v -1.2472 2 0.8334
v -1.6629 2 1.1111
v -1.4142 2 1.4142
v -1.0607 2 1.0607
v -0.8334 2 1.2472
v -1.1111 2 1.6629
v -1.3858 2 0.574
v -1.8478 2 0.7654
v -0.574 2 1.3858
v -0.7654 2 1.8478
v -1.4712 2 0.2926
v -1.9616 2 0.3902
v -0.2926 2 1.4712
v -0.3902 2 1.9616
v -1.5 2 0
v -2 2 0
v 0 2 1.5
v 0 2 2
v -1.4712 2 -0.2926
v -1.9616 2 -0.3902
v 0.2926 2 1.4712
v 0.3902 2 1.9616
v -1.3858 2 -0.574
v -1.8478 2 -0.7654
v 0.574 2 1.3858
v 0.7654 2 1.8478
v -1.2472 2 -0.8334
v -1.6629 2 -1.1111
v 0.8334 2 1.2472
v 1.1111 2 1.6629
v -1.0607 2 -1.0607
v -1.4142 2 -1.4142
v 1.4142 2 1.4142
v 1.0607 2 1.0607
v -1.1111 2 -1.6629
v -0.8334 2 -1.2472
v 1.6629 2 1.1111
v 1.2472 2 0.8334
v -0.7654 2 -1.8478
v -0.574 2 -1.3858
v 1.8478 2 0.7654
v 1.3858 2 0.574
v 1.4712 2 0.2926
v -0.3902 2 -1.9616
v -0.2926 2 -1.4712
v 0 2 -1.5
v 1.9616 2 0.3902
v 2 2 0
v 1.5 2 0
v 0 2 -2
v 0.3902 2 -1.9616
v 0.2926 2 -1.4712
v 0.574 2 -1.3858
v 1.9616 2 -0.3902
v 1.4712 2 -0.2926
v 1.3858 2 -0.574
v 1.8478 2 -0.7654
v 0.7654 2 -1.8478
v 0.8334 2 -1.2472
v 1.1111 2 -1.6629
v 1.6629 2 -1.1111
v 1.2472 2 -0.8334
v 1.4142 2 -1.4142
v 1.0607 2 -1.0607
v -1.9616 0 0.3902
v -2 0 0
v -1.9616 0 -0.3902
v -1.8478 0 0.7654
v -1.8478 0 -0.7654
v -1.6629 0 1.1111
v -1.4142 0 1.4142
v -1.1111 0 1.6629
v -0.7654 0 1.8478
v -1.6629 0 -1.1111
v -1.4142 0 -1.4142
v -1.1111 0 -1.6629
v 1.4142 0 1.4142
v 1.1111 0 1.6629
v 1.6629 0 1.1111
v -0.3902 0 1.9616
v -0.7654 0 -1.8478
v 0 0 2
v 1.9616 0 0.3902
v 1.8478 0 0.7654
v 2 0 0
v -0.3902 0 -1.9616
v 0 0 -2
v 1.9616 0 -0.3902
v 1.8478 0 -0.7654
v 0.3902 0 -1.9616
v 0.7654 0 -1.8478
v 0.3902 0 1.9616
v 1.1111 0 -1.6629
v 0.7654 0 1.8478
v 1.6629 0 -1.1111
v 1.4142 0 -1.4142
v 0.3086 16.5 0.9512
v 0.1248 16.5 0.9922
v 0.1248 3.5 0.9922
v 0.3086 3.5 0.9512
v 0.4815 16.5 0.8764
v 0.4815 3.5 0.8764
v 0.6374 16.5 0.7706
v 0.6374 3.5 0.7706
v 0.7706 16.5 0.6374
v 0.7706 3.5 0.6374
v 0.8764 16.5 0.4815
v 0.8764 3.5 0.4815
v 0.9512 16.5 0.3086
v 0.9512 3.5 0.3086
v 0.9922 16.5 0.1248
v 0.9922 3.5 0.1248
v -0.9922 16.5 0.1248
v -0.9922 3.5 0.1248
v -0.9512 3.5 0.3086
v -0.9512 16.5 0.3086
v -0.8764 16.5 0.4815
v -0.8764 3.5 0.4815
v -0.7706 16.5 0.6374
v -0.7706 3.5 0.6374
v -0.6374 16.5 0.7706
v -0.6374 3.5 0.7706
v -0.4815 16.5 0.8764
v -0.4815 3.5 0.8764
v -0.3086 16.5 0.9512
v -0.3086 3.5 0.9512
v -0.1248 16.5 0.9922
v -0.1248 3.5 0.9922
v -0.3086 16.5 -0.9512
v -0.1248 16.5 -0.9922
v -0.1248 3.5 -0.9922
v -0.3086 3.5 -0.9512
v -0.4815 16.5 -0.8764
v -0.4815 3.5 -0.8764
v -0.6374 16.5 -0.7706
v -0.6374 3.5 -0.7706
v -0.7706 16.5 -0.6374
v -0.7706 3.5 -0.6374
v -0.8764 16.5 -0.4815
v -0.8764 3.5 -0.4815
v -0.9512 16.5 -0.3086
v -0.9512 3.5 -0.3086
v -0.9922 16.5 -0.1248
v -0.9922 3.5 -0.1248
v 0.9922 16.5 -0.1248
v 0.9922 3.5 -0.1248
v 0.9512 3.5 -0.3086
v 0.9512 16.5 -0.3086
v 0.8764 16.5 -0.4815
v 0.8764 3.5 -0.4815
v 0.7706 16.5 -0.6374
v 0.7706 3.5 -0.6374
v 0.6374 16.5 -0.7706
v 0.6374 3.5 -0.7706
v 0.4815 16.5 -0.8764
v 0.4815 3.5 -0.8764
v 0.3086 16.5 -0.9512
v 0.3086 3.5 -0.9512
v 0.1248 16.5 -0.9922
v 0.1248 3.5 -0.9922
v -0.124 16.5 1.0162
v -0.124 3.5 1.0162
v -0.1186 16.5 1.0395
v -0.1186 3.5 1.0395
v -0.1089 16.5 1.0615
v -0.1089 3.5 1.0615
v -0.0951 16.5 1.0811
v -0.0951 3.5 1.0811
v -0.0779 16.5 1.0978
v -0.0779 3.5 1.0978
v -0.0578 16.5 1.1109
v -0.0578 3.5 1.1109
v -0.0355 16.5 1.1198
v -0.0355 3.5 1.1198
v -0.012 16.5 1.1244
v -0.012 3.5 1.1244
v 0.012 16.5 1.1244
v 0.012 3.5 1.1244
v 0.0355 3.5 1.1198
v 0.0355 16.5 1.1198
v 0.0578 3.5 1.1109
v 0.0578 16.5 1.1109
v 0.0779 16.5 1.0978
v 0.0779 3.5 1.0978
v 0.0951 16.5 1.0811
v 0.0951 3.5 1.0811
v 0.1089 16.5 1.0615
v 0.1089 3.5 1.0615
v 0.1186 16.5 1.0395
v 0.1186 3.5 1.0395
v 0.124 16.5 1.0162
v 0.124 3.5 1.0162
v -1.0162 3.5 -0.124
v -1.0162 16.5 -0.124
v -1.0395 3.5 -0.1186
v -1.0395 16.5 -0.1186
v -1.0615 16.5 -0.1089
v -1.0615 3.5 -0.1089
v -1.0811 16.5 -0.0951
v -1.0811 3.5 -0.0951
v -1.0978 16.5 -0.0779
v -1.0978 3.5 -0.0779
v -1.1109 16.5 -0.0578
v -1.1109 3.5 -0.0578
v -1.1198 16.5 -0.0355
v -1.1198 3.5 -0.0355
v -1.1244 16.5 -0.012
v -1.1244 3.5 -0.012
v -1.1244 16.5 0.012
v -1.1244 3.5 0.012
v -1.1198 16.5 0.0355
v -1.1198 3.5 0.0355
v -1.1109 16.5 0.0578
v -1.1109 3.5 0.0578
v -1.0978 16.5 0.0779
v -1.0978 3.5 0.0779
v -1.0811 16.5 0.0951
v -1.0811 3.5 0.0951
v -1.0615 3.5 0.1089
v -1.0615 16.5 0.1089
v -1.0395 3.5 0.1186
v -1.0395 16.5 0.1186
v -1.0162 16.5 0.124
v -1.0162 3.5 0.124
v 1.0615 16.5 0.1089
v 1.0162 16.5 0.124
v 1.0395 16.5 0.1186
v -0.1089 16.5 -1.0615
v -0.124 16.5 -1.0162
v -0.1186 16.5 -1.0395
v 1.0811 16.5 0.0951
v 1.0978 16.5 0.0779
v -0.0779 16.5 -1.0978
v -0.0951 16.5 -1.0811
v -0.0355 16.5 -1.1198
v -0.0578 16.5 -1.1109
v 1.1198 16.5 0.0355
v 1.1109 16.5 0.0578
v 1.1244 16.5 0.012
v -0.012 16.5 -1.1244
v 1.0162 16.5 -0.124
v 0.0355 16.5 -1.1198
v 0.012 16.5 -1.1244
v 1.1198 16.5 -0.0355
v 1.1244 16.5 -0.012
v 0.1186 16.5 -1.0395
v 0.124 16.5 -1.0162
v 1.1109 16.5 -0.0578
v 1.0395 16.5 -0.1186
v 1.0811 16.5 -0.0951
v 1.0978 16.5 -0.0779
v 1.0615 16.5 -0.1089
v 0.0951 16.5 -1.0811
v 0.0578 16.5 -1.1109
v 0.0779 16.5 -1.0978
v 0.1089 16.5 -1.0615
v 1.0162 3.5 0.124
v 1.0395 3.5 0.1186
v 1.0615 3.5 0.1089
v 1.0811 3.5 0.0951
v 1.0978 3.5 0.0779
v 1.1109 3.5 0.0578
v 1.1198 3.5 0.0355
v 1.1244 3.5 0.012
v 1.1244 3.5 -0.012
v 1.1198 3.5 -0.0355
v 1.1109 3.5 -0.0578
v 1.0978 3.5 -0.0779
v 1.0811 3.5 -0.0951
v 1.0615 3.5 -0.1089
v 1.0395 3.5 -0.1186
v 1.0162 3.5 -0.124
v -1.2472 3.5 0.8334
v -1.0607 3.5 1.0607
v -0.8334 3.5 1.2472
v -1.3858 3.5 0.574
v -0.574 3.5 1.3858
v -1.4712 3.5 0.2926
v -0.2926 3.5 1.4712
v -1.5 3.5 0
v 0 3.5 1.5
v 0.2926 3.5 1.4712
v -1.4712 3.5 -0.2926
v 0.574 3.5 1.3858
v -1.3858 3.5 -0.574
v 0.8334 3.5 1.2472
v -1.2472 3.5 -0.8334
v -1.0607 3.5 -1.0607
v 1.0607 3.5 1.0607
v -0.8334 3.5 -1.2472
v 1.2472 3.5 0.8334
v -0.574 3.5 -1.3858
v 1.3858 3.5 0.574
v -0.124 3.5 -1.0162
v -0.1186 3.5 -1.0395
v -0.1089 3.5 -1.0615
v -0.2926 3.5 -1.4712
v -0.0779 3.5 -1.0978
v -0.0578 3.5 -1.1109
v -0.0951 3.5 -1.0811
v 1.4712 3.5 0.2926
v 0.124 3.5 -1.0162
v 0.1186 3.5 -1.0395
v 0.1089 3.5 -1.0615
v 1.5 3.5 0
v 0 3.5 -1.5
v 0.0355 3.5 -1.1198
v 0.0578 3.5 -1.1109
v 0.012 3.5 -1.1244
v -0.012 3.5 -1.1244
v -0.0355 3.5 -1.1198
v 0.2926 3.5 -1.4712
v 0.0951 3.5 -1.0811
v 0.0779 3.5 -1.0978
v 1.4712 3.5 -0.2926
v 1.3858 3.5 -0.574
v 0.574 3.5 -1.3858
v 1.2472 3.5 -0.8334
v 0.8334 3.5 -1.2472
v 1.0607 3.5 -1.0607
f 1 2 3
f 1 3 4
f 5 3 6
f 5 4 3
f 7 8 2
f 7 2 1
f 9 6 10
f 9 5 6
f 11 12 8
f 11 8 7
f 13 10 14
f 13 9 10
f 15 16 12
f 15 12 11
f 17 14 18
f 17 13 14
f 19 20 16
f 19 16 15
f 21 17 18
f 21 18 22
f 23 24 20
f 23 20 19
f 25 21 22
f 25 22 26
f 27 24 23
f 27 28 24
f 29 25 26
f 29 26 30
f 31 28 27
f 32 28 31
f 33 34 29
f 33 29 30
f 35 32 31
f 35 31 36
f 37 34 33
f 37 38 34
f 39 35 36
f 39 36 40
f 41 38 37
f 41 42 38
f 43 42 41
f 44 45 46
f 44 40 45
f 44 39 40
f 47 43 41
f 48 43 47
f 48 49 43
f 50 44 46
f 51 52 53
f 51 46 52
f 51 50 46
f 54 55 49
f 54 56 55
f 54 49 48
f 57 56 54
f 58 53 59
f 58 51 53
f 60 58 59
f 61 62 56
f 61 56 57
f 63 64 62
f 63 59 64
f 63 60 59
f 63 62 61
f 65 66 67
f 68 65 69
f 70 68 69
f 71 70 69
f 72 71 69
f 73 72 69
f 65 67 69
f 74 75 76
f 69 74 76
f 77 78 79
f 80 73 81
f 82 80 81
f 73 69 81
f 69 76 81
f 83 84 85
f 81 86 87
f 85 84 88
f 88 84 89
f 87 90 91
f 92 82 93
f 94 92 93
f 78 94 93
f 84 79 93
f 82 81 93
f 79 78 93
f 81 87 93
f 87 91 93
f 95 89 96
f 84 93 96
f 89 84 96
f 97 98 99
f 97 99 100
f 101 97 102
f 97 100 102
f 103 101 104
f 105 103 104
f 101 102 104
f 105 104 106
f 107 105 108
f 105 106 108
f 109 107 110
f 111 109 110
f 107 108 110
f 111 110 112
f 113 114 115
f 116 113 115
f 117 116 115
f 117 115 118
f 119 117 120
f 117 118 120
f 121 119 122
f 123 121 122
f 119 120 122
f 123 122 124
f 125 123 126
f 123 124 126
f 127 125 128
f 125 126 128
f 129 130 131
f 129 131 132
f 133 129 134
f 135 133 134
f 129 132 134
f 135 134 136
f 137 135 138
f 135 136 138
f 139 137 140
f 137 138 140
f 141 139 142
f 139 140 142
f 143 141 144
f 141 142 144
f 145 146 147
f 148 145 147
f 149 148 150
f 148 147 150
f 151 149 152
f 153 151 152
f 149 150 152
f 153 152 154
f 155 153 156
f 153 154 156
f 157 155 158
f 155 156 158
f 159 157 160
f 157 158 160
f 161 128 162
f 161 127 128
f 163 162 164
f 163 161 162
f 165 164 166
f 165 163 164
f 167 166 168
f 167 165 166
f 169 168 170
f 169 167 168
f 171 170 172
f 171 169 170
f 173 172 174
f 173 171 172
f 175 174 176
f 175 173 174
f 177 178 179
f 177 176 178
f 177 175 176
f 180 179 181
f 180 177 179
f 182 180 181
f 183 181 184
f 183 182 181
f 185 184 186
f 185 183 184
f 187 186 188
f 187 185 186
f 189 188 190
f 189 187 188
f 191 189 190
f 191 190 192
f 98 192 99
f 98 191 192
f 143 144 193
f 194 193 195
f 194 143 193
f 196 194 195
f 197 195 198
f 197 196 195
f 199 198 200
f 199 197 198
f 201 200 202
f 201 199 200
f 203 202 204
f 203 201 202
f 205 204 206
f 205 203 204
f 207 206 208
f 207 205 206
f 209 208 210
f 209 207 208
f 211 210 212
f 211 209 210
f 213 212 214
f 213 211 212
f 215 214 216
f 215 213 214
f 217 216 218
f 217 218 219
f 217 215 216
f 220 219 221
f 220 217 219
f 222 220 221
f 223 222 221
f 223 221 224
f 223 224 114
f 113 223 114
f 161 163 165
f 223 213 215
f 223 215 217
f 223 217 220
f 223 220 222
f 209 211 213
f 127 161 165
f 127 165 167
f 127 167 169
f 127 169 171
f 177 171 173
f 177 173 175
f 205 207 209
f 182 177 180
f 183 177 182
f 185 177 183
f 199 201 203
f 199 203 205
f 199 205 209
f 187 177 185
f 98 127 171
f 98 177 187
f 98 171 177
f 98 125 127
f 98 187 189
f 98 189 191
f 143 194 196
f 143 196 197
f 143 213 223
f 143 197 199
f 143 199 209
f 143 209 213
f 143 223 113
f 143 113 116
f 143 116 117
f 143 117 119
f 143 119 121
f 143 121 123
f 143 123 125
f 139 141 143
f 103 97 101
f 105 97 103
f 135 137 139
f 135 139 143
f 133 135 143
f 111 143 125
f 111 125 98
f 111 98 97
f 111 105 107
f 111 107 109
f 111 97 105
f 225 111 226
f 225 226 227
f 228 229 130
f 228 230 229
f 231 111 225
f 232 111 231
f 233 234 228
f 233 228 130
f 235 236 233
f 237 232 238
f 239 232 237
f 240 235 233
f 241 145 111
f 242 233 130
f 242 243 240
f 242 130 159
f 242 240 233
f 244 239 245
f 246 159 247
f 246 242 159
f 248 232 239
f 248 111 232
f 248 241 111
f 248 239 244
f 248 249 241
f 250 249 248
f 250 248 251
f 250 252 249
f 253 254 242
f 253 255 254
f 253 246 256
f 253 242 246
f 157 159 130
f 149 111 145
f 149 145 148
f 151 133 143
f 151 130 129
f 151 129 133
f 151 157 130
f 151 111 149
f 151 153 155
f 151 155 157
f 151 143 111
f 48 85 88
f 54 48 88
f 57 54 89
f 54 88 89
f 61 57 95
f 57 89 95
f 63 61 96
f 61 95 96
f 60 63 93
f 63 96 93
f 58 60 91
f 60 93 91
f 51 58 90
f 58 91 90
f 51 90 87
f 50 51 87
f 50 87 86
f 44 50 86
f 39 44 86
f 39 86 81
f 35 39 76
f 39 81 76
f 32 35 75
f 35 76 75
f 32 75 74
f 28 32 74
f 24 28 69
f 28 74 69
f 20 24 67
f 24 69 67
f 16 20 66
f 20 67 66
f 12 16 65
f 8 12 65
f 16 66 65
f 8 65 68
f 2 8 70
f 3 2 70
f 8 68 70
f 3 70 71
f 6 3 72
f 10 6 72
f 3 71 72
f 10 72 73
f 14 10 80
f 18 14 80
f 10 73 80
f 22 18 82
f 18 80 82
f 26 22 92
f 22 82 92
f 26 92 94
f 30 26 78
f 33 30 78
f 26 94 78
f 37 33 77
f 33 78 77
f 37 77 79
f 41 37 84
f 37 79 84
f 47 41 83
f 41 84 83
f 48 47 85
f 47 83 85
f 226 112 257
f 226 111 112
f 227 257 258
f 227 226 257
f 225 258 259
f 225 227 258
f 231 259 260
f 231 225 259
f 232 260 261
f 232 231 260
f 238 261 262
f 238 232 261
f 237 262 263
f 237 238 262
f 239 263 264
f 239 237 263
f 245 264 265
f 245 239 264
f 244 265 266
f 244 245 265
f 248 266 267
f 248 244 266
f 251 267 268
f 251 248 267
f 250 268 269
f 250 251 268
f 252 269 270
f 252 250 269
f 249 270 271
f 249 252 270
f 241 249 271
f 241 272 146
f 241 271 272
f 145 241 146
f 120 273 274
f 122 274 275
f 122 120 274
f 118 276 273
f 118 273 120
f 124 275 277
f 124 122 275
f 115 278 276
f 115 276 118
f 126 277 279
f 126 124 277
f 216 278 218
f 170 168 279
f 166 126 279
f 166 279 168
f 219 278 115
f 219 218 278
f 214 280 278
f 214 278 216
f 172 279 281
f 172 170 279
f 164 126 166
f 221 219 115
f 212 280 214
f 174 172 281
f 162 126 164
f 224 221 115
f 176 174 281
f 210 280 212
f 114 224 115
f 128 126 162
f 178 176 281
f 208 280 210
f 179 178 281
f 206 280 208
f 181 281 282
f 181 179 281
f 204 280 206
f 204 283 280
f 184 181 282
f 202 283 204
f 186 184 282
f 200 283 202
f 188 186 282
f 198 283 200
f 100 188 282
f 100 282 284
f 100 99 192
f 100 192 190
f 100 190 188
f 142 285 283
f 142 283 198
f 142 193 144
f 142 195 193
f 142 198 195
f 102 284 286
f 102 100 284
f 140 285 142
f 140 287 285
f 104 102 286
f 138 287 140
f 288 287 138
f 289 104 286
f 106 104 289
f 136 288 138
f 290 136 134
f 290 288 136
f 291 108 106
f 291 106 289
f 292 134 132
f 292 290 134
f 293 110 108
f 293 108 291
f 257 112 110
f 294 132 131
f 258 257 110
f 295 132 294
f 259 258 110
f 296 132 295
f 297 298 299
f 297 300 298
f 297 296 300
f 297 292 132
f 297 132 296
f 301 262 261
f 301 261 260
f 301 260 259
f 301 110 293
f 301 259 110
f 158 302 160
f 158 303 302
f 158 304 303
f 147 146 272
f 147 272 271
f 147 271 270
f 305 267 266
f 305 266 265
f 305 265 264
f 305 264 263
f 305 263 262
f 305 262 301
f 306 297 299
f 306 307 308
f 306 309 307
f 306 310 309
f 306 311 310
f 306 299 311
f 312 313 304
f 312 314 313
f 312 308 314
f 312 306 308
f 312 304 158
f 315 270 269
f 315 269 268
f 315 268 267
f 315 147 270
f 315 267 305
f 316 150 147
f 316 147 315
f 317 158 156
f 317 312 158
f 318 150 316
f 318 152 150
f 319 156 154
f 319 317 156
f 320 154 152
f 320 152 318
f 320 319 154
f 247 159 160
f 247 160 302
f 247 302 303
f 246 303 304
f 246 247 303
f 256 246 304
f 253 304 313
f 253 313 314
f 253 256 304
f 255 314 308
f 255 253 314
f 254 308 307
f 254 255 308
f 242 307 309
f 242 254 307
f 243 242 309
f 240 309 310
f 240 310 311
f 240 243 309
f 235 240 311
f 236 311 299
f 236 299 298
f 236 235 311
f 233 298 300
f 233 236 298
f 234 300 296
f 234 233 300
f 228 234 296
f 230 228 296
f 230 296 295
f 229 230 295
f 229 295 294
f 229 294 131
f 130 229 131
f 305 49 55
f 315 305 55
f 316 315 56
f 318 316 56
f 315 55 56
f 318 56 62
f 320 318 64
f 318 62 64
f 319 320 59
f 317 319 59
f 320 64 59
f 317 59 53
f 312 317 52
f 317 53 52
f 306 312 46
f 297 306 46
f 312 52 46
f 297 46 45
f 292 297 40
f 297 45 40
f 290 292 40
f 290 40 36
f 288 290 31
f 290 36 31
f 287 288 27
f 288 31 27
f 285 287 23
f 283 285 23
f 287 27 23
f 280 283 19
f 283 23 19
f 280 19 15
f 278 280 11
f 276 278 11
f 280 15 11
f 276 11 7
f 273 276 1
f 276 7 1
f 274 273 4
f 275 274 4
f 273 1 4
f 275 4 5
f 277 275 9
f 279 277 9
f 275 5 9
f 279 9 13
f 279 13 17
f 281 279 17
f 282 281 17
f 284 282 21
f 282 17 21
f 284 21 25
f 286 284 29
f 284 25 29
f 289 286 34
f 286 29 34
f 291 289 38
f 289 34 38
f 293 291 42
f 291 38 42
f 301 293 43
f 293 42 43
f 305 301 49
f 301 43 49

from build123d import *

# Parameters (mm, degrees)
SKETCH1_R           = 2
BOSS_EXTRUDE1_DEPTH = 2
SKETCH2_R           = 1.5
BOSS_EXTRUDE2_DEPTH = 1.5
SKETCH3_R           = 1
BOSS_EXTRUDE3_DEPTH = 13
SKETCH4_R           = 0.125
BOSS_EXTRUDE4_DEPTH = 13


with BuildPart() as part:
    # Sketch1 → Boss-Extrude1 (new body)
    with BuildSketch(Plane(origin=(0, 0, 0), x_dir=(1, 0, 0), z_dir=(0, 1, 0))):
        Circle(SKETCH1_R)
    extrude(amount=BOSS_EXTRUDE1_DEPTH)

    # Sketch2 → Boss-Extrude2 (add)
    with BuildSketch(Plane(origin=(0, 2, 0), x_dir=(1, 0, 0), z_dir=(0, 1, 0))):
        Circle(SKETCH2_R)
    extrude(amount=BOSS_EXTRUDE2_DEPTH)

    # Sketch3 → Boss-Extrude3 (add)
    with BuildSketch(Plane(origin=(0, 3.5, 0), x_dir=(1, 0, 0), z_dir=(0, 1, 0))):
        Circle(SKETCH3_R)
    extrude(amount=BOSS_EXTRUDE3_DEPTH)

    # Sketch4 → Boss-Extrude4 (add)
    with BuildSketch(Plane(origin=(0, 16.5, 0), x_dir=(1, 0, 0), z_dir=(0, 1, 0))):
        with Locations((0, 1)):
            Circle(SKETCH4_R)
        with Locations((-1, 0)):
            Circle(SKETCH4_R)
        with Locations((0, -1)):
            Circle(SKETCH4_R)
        with Locations((1, 0)):
            Circle(SKETCH4_R)
    extrude(amount=-BOSS_EXTRUDE4_DEPTH)


solid = part.part
